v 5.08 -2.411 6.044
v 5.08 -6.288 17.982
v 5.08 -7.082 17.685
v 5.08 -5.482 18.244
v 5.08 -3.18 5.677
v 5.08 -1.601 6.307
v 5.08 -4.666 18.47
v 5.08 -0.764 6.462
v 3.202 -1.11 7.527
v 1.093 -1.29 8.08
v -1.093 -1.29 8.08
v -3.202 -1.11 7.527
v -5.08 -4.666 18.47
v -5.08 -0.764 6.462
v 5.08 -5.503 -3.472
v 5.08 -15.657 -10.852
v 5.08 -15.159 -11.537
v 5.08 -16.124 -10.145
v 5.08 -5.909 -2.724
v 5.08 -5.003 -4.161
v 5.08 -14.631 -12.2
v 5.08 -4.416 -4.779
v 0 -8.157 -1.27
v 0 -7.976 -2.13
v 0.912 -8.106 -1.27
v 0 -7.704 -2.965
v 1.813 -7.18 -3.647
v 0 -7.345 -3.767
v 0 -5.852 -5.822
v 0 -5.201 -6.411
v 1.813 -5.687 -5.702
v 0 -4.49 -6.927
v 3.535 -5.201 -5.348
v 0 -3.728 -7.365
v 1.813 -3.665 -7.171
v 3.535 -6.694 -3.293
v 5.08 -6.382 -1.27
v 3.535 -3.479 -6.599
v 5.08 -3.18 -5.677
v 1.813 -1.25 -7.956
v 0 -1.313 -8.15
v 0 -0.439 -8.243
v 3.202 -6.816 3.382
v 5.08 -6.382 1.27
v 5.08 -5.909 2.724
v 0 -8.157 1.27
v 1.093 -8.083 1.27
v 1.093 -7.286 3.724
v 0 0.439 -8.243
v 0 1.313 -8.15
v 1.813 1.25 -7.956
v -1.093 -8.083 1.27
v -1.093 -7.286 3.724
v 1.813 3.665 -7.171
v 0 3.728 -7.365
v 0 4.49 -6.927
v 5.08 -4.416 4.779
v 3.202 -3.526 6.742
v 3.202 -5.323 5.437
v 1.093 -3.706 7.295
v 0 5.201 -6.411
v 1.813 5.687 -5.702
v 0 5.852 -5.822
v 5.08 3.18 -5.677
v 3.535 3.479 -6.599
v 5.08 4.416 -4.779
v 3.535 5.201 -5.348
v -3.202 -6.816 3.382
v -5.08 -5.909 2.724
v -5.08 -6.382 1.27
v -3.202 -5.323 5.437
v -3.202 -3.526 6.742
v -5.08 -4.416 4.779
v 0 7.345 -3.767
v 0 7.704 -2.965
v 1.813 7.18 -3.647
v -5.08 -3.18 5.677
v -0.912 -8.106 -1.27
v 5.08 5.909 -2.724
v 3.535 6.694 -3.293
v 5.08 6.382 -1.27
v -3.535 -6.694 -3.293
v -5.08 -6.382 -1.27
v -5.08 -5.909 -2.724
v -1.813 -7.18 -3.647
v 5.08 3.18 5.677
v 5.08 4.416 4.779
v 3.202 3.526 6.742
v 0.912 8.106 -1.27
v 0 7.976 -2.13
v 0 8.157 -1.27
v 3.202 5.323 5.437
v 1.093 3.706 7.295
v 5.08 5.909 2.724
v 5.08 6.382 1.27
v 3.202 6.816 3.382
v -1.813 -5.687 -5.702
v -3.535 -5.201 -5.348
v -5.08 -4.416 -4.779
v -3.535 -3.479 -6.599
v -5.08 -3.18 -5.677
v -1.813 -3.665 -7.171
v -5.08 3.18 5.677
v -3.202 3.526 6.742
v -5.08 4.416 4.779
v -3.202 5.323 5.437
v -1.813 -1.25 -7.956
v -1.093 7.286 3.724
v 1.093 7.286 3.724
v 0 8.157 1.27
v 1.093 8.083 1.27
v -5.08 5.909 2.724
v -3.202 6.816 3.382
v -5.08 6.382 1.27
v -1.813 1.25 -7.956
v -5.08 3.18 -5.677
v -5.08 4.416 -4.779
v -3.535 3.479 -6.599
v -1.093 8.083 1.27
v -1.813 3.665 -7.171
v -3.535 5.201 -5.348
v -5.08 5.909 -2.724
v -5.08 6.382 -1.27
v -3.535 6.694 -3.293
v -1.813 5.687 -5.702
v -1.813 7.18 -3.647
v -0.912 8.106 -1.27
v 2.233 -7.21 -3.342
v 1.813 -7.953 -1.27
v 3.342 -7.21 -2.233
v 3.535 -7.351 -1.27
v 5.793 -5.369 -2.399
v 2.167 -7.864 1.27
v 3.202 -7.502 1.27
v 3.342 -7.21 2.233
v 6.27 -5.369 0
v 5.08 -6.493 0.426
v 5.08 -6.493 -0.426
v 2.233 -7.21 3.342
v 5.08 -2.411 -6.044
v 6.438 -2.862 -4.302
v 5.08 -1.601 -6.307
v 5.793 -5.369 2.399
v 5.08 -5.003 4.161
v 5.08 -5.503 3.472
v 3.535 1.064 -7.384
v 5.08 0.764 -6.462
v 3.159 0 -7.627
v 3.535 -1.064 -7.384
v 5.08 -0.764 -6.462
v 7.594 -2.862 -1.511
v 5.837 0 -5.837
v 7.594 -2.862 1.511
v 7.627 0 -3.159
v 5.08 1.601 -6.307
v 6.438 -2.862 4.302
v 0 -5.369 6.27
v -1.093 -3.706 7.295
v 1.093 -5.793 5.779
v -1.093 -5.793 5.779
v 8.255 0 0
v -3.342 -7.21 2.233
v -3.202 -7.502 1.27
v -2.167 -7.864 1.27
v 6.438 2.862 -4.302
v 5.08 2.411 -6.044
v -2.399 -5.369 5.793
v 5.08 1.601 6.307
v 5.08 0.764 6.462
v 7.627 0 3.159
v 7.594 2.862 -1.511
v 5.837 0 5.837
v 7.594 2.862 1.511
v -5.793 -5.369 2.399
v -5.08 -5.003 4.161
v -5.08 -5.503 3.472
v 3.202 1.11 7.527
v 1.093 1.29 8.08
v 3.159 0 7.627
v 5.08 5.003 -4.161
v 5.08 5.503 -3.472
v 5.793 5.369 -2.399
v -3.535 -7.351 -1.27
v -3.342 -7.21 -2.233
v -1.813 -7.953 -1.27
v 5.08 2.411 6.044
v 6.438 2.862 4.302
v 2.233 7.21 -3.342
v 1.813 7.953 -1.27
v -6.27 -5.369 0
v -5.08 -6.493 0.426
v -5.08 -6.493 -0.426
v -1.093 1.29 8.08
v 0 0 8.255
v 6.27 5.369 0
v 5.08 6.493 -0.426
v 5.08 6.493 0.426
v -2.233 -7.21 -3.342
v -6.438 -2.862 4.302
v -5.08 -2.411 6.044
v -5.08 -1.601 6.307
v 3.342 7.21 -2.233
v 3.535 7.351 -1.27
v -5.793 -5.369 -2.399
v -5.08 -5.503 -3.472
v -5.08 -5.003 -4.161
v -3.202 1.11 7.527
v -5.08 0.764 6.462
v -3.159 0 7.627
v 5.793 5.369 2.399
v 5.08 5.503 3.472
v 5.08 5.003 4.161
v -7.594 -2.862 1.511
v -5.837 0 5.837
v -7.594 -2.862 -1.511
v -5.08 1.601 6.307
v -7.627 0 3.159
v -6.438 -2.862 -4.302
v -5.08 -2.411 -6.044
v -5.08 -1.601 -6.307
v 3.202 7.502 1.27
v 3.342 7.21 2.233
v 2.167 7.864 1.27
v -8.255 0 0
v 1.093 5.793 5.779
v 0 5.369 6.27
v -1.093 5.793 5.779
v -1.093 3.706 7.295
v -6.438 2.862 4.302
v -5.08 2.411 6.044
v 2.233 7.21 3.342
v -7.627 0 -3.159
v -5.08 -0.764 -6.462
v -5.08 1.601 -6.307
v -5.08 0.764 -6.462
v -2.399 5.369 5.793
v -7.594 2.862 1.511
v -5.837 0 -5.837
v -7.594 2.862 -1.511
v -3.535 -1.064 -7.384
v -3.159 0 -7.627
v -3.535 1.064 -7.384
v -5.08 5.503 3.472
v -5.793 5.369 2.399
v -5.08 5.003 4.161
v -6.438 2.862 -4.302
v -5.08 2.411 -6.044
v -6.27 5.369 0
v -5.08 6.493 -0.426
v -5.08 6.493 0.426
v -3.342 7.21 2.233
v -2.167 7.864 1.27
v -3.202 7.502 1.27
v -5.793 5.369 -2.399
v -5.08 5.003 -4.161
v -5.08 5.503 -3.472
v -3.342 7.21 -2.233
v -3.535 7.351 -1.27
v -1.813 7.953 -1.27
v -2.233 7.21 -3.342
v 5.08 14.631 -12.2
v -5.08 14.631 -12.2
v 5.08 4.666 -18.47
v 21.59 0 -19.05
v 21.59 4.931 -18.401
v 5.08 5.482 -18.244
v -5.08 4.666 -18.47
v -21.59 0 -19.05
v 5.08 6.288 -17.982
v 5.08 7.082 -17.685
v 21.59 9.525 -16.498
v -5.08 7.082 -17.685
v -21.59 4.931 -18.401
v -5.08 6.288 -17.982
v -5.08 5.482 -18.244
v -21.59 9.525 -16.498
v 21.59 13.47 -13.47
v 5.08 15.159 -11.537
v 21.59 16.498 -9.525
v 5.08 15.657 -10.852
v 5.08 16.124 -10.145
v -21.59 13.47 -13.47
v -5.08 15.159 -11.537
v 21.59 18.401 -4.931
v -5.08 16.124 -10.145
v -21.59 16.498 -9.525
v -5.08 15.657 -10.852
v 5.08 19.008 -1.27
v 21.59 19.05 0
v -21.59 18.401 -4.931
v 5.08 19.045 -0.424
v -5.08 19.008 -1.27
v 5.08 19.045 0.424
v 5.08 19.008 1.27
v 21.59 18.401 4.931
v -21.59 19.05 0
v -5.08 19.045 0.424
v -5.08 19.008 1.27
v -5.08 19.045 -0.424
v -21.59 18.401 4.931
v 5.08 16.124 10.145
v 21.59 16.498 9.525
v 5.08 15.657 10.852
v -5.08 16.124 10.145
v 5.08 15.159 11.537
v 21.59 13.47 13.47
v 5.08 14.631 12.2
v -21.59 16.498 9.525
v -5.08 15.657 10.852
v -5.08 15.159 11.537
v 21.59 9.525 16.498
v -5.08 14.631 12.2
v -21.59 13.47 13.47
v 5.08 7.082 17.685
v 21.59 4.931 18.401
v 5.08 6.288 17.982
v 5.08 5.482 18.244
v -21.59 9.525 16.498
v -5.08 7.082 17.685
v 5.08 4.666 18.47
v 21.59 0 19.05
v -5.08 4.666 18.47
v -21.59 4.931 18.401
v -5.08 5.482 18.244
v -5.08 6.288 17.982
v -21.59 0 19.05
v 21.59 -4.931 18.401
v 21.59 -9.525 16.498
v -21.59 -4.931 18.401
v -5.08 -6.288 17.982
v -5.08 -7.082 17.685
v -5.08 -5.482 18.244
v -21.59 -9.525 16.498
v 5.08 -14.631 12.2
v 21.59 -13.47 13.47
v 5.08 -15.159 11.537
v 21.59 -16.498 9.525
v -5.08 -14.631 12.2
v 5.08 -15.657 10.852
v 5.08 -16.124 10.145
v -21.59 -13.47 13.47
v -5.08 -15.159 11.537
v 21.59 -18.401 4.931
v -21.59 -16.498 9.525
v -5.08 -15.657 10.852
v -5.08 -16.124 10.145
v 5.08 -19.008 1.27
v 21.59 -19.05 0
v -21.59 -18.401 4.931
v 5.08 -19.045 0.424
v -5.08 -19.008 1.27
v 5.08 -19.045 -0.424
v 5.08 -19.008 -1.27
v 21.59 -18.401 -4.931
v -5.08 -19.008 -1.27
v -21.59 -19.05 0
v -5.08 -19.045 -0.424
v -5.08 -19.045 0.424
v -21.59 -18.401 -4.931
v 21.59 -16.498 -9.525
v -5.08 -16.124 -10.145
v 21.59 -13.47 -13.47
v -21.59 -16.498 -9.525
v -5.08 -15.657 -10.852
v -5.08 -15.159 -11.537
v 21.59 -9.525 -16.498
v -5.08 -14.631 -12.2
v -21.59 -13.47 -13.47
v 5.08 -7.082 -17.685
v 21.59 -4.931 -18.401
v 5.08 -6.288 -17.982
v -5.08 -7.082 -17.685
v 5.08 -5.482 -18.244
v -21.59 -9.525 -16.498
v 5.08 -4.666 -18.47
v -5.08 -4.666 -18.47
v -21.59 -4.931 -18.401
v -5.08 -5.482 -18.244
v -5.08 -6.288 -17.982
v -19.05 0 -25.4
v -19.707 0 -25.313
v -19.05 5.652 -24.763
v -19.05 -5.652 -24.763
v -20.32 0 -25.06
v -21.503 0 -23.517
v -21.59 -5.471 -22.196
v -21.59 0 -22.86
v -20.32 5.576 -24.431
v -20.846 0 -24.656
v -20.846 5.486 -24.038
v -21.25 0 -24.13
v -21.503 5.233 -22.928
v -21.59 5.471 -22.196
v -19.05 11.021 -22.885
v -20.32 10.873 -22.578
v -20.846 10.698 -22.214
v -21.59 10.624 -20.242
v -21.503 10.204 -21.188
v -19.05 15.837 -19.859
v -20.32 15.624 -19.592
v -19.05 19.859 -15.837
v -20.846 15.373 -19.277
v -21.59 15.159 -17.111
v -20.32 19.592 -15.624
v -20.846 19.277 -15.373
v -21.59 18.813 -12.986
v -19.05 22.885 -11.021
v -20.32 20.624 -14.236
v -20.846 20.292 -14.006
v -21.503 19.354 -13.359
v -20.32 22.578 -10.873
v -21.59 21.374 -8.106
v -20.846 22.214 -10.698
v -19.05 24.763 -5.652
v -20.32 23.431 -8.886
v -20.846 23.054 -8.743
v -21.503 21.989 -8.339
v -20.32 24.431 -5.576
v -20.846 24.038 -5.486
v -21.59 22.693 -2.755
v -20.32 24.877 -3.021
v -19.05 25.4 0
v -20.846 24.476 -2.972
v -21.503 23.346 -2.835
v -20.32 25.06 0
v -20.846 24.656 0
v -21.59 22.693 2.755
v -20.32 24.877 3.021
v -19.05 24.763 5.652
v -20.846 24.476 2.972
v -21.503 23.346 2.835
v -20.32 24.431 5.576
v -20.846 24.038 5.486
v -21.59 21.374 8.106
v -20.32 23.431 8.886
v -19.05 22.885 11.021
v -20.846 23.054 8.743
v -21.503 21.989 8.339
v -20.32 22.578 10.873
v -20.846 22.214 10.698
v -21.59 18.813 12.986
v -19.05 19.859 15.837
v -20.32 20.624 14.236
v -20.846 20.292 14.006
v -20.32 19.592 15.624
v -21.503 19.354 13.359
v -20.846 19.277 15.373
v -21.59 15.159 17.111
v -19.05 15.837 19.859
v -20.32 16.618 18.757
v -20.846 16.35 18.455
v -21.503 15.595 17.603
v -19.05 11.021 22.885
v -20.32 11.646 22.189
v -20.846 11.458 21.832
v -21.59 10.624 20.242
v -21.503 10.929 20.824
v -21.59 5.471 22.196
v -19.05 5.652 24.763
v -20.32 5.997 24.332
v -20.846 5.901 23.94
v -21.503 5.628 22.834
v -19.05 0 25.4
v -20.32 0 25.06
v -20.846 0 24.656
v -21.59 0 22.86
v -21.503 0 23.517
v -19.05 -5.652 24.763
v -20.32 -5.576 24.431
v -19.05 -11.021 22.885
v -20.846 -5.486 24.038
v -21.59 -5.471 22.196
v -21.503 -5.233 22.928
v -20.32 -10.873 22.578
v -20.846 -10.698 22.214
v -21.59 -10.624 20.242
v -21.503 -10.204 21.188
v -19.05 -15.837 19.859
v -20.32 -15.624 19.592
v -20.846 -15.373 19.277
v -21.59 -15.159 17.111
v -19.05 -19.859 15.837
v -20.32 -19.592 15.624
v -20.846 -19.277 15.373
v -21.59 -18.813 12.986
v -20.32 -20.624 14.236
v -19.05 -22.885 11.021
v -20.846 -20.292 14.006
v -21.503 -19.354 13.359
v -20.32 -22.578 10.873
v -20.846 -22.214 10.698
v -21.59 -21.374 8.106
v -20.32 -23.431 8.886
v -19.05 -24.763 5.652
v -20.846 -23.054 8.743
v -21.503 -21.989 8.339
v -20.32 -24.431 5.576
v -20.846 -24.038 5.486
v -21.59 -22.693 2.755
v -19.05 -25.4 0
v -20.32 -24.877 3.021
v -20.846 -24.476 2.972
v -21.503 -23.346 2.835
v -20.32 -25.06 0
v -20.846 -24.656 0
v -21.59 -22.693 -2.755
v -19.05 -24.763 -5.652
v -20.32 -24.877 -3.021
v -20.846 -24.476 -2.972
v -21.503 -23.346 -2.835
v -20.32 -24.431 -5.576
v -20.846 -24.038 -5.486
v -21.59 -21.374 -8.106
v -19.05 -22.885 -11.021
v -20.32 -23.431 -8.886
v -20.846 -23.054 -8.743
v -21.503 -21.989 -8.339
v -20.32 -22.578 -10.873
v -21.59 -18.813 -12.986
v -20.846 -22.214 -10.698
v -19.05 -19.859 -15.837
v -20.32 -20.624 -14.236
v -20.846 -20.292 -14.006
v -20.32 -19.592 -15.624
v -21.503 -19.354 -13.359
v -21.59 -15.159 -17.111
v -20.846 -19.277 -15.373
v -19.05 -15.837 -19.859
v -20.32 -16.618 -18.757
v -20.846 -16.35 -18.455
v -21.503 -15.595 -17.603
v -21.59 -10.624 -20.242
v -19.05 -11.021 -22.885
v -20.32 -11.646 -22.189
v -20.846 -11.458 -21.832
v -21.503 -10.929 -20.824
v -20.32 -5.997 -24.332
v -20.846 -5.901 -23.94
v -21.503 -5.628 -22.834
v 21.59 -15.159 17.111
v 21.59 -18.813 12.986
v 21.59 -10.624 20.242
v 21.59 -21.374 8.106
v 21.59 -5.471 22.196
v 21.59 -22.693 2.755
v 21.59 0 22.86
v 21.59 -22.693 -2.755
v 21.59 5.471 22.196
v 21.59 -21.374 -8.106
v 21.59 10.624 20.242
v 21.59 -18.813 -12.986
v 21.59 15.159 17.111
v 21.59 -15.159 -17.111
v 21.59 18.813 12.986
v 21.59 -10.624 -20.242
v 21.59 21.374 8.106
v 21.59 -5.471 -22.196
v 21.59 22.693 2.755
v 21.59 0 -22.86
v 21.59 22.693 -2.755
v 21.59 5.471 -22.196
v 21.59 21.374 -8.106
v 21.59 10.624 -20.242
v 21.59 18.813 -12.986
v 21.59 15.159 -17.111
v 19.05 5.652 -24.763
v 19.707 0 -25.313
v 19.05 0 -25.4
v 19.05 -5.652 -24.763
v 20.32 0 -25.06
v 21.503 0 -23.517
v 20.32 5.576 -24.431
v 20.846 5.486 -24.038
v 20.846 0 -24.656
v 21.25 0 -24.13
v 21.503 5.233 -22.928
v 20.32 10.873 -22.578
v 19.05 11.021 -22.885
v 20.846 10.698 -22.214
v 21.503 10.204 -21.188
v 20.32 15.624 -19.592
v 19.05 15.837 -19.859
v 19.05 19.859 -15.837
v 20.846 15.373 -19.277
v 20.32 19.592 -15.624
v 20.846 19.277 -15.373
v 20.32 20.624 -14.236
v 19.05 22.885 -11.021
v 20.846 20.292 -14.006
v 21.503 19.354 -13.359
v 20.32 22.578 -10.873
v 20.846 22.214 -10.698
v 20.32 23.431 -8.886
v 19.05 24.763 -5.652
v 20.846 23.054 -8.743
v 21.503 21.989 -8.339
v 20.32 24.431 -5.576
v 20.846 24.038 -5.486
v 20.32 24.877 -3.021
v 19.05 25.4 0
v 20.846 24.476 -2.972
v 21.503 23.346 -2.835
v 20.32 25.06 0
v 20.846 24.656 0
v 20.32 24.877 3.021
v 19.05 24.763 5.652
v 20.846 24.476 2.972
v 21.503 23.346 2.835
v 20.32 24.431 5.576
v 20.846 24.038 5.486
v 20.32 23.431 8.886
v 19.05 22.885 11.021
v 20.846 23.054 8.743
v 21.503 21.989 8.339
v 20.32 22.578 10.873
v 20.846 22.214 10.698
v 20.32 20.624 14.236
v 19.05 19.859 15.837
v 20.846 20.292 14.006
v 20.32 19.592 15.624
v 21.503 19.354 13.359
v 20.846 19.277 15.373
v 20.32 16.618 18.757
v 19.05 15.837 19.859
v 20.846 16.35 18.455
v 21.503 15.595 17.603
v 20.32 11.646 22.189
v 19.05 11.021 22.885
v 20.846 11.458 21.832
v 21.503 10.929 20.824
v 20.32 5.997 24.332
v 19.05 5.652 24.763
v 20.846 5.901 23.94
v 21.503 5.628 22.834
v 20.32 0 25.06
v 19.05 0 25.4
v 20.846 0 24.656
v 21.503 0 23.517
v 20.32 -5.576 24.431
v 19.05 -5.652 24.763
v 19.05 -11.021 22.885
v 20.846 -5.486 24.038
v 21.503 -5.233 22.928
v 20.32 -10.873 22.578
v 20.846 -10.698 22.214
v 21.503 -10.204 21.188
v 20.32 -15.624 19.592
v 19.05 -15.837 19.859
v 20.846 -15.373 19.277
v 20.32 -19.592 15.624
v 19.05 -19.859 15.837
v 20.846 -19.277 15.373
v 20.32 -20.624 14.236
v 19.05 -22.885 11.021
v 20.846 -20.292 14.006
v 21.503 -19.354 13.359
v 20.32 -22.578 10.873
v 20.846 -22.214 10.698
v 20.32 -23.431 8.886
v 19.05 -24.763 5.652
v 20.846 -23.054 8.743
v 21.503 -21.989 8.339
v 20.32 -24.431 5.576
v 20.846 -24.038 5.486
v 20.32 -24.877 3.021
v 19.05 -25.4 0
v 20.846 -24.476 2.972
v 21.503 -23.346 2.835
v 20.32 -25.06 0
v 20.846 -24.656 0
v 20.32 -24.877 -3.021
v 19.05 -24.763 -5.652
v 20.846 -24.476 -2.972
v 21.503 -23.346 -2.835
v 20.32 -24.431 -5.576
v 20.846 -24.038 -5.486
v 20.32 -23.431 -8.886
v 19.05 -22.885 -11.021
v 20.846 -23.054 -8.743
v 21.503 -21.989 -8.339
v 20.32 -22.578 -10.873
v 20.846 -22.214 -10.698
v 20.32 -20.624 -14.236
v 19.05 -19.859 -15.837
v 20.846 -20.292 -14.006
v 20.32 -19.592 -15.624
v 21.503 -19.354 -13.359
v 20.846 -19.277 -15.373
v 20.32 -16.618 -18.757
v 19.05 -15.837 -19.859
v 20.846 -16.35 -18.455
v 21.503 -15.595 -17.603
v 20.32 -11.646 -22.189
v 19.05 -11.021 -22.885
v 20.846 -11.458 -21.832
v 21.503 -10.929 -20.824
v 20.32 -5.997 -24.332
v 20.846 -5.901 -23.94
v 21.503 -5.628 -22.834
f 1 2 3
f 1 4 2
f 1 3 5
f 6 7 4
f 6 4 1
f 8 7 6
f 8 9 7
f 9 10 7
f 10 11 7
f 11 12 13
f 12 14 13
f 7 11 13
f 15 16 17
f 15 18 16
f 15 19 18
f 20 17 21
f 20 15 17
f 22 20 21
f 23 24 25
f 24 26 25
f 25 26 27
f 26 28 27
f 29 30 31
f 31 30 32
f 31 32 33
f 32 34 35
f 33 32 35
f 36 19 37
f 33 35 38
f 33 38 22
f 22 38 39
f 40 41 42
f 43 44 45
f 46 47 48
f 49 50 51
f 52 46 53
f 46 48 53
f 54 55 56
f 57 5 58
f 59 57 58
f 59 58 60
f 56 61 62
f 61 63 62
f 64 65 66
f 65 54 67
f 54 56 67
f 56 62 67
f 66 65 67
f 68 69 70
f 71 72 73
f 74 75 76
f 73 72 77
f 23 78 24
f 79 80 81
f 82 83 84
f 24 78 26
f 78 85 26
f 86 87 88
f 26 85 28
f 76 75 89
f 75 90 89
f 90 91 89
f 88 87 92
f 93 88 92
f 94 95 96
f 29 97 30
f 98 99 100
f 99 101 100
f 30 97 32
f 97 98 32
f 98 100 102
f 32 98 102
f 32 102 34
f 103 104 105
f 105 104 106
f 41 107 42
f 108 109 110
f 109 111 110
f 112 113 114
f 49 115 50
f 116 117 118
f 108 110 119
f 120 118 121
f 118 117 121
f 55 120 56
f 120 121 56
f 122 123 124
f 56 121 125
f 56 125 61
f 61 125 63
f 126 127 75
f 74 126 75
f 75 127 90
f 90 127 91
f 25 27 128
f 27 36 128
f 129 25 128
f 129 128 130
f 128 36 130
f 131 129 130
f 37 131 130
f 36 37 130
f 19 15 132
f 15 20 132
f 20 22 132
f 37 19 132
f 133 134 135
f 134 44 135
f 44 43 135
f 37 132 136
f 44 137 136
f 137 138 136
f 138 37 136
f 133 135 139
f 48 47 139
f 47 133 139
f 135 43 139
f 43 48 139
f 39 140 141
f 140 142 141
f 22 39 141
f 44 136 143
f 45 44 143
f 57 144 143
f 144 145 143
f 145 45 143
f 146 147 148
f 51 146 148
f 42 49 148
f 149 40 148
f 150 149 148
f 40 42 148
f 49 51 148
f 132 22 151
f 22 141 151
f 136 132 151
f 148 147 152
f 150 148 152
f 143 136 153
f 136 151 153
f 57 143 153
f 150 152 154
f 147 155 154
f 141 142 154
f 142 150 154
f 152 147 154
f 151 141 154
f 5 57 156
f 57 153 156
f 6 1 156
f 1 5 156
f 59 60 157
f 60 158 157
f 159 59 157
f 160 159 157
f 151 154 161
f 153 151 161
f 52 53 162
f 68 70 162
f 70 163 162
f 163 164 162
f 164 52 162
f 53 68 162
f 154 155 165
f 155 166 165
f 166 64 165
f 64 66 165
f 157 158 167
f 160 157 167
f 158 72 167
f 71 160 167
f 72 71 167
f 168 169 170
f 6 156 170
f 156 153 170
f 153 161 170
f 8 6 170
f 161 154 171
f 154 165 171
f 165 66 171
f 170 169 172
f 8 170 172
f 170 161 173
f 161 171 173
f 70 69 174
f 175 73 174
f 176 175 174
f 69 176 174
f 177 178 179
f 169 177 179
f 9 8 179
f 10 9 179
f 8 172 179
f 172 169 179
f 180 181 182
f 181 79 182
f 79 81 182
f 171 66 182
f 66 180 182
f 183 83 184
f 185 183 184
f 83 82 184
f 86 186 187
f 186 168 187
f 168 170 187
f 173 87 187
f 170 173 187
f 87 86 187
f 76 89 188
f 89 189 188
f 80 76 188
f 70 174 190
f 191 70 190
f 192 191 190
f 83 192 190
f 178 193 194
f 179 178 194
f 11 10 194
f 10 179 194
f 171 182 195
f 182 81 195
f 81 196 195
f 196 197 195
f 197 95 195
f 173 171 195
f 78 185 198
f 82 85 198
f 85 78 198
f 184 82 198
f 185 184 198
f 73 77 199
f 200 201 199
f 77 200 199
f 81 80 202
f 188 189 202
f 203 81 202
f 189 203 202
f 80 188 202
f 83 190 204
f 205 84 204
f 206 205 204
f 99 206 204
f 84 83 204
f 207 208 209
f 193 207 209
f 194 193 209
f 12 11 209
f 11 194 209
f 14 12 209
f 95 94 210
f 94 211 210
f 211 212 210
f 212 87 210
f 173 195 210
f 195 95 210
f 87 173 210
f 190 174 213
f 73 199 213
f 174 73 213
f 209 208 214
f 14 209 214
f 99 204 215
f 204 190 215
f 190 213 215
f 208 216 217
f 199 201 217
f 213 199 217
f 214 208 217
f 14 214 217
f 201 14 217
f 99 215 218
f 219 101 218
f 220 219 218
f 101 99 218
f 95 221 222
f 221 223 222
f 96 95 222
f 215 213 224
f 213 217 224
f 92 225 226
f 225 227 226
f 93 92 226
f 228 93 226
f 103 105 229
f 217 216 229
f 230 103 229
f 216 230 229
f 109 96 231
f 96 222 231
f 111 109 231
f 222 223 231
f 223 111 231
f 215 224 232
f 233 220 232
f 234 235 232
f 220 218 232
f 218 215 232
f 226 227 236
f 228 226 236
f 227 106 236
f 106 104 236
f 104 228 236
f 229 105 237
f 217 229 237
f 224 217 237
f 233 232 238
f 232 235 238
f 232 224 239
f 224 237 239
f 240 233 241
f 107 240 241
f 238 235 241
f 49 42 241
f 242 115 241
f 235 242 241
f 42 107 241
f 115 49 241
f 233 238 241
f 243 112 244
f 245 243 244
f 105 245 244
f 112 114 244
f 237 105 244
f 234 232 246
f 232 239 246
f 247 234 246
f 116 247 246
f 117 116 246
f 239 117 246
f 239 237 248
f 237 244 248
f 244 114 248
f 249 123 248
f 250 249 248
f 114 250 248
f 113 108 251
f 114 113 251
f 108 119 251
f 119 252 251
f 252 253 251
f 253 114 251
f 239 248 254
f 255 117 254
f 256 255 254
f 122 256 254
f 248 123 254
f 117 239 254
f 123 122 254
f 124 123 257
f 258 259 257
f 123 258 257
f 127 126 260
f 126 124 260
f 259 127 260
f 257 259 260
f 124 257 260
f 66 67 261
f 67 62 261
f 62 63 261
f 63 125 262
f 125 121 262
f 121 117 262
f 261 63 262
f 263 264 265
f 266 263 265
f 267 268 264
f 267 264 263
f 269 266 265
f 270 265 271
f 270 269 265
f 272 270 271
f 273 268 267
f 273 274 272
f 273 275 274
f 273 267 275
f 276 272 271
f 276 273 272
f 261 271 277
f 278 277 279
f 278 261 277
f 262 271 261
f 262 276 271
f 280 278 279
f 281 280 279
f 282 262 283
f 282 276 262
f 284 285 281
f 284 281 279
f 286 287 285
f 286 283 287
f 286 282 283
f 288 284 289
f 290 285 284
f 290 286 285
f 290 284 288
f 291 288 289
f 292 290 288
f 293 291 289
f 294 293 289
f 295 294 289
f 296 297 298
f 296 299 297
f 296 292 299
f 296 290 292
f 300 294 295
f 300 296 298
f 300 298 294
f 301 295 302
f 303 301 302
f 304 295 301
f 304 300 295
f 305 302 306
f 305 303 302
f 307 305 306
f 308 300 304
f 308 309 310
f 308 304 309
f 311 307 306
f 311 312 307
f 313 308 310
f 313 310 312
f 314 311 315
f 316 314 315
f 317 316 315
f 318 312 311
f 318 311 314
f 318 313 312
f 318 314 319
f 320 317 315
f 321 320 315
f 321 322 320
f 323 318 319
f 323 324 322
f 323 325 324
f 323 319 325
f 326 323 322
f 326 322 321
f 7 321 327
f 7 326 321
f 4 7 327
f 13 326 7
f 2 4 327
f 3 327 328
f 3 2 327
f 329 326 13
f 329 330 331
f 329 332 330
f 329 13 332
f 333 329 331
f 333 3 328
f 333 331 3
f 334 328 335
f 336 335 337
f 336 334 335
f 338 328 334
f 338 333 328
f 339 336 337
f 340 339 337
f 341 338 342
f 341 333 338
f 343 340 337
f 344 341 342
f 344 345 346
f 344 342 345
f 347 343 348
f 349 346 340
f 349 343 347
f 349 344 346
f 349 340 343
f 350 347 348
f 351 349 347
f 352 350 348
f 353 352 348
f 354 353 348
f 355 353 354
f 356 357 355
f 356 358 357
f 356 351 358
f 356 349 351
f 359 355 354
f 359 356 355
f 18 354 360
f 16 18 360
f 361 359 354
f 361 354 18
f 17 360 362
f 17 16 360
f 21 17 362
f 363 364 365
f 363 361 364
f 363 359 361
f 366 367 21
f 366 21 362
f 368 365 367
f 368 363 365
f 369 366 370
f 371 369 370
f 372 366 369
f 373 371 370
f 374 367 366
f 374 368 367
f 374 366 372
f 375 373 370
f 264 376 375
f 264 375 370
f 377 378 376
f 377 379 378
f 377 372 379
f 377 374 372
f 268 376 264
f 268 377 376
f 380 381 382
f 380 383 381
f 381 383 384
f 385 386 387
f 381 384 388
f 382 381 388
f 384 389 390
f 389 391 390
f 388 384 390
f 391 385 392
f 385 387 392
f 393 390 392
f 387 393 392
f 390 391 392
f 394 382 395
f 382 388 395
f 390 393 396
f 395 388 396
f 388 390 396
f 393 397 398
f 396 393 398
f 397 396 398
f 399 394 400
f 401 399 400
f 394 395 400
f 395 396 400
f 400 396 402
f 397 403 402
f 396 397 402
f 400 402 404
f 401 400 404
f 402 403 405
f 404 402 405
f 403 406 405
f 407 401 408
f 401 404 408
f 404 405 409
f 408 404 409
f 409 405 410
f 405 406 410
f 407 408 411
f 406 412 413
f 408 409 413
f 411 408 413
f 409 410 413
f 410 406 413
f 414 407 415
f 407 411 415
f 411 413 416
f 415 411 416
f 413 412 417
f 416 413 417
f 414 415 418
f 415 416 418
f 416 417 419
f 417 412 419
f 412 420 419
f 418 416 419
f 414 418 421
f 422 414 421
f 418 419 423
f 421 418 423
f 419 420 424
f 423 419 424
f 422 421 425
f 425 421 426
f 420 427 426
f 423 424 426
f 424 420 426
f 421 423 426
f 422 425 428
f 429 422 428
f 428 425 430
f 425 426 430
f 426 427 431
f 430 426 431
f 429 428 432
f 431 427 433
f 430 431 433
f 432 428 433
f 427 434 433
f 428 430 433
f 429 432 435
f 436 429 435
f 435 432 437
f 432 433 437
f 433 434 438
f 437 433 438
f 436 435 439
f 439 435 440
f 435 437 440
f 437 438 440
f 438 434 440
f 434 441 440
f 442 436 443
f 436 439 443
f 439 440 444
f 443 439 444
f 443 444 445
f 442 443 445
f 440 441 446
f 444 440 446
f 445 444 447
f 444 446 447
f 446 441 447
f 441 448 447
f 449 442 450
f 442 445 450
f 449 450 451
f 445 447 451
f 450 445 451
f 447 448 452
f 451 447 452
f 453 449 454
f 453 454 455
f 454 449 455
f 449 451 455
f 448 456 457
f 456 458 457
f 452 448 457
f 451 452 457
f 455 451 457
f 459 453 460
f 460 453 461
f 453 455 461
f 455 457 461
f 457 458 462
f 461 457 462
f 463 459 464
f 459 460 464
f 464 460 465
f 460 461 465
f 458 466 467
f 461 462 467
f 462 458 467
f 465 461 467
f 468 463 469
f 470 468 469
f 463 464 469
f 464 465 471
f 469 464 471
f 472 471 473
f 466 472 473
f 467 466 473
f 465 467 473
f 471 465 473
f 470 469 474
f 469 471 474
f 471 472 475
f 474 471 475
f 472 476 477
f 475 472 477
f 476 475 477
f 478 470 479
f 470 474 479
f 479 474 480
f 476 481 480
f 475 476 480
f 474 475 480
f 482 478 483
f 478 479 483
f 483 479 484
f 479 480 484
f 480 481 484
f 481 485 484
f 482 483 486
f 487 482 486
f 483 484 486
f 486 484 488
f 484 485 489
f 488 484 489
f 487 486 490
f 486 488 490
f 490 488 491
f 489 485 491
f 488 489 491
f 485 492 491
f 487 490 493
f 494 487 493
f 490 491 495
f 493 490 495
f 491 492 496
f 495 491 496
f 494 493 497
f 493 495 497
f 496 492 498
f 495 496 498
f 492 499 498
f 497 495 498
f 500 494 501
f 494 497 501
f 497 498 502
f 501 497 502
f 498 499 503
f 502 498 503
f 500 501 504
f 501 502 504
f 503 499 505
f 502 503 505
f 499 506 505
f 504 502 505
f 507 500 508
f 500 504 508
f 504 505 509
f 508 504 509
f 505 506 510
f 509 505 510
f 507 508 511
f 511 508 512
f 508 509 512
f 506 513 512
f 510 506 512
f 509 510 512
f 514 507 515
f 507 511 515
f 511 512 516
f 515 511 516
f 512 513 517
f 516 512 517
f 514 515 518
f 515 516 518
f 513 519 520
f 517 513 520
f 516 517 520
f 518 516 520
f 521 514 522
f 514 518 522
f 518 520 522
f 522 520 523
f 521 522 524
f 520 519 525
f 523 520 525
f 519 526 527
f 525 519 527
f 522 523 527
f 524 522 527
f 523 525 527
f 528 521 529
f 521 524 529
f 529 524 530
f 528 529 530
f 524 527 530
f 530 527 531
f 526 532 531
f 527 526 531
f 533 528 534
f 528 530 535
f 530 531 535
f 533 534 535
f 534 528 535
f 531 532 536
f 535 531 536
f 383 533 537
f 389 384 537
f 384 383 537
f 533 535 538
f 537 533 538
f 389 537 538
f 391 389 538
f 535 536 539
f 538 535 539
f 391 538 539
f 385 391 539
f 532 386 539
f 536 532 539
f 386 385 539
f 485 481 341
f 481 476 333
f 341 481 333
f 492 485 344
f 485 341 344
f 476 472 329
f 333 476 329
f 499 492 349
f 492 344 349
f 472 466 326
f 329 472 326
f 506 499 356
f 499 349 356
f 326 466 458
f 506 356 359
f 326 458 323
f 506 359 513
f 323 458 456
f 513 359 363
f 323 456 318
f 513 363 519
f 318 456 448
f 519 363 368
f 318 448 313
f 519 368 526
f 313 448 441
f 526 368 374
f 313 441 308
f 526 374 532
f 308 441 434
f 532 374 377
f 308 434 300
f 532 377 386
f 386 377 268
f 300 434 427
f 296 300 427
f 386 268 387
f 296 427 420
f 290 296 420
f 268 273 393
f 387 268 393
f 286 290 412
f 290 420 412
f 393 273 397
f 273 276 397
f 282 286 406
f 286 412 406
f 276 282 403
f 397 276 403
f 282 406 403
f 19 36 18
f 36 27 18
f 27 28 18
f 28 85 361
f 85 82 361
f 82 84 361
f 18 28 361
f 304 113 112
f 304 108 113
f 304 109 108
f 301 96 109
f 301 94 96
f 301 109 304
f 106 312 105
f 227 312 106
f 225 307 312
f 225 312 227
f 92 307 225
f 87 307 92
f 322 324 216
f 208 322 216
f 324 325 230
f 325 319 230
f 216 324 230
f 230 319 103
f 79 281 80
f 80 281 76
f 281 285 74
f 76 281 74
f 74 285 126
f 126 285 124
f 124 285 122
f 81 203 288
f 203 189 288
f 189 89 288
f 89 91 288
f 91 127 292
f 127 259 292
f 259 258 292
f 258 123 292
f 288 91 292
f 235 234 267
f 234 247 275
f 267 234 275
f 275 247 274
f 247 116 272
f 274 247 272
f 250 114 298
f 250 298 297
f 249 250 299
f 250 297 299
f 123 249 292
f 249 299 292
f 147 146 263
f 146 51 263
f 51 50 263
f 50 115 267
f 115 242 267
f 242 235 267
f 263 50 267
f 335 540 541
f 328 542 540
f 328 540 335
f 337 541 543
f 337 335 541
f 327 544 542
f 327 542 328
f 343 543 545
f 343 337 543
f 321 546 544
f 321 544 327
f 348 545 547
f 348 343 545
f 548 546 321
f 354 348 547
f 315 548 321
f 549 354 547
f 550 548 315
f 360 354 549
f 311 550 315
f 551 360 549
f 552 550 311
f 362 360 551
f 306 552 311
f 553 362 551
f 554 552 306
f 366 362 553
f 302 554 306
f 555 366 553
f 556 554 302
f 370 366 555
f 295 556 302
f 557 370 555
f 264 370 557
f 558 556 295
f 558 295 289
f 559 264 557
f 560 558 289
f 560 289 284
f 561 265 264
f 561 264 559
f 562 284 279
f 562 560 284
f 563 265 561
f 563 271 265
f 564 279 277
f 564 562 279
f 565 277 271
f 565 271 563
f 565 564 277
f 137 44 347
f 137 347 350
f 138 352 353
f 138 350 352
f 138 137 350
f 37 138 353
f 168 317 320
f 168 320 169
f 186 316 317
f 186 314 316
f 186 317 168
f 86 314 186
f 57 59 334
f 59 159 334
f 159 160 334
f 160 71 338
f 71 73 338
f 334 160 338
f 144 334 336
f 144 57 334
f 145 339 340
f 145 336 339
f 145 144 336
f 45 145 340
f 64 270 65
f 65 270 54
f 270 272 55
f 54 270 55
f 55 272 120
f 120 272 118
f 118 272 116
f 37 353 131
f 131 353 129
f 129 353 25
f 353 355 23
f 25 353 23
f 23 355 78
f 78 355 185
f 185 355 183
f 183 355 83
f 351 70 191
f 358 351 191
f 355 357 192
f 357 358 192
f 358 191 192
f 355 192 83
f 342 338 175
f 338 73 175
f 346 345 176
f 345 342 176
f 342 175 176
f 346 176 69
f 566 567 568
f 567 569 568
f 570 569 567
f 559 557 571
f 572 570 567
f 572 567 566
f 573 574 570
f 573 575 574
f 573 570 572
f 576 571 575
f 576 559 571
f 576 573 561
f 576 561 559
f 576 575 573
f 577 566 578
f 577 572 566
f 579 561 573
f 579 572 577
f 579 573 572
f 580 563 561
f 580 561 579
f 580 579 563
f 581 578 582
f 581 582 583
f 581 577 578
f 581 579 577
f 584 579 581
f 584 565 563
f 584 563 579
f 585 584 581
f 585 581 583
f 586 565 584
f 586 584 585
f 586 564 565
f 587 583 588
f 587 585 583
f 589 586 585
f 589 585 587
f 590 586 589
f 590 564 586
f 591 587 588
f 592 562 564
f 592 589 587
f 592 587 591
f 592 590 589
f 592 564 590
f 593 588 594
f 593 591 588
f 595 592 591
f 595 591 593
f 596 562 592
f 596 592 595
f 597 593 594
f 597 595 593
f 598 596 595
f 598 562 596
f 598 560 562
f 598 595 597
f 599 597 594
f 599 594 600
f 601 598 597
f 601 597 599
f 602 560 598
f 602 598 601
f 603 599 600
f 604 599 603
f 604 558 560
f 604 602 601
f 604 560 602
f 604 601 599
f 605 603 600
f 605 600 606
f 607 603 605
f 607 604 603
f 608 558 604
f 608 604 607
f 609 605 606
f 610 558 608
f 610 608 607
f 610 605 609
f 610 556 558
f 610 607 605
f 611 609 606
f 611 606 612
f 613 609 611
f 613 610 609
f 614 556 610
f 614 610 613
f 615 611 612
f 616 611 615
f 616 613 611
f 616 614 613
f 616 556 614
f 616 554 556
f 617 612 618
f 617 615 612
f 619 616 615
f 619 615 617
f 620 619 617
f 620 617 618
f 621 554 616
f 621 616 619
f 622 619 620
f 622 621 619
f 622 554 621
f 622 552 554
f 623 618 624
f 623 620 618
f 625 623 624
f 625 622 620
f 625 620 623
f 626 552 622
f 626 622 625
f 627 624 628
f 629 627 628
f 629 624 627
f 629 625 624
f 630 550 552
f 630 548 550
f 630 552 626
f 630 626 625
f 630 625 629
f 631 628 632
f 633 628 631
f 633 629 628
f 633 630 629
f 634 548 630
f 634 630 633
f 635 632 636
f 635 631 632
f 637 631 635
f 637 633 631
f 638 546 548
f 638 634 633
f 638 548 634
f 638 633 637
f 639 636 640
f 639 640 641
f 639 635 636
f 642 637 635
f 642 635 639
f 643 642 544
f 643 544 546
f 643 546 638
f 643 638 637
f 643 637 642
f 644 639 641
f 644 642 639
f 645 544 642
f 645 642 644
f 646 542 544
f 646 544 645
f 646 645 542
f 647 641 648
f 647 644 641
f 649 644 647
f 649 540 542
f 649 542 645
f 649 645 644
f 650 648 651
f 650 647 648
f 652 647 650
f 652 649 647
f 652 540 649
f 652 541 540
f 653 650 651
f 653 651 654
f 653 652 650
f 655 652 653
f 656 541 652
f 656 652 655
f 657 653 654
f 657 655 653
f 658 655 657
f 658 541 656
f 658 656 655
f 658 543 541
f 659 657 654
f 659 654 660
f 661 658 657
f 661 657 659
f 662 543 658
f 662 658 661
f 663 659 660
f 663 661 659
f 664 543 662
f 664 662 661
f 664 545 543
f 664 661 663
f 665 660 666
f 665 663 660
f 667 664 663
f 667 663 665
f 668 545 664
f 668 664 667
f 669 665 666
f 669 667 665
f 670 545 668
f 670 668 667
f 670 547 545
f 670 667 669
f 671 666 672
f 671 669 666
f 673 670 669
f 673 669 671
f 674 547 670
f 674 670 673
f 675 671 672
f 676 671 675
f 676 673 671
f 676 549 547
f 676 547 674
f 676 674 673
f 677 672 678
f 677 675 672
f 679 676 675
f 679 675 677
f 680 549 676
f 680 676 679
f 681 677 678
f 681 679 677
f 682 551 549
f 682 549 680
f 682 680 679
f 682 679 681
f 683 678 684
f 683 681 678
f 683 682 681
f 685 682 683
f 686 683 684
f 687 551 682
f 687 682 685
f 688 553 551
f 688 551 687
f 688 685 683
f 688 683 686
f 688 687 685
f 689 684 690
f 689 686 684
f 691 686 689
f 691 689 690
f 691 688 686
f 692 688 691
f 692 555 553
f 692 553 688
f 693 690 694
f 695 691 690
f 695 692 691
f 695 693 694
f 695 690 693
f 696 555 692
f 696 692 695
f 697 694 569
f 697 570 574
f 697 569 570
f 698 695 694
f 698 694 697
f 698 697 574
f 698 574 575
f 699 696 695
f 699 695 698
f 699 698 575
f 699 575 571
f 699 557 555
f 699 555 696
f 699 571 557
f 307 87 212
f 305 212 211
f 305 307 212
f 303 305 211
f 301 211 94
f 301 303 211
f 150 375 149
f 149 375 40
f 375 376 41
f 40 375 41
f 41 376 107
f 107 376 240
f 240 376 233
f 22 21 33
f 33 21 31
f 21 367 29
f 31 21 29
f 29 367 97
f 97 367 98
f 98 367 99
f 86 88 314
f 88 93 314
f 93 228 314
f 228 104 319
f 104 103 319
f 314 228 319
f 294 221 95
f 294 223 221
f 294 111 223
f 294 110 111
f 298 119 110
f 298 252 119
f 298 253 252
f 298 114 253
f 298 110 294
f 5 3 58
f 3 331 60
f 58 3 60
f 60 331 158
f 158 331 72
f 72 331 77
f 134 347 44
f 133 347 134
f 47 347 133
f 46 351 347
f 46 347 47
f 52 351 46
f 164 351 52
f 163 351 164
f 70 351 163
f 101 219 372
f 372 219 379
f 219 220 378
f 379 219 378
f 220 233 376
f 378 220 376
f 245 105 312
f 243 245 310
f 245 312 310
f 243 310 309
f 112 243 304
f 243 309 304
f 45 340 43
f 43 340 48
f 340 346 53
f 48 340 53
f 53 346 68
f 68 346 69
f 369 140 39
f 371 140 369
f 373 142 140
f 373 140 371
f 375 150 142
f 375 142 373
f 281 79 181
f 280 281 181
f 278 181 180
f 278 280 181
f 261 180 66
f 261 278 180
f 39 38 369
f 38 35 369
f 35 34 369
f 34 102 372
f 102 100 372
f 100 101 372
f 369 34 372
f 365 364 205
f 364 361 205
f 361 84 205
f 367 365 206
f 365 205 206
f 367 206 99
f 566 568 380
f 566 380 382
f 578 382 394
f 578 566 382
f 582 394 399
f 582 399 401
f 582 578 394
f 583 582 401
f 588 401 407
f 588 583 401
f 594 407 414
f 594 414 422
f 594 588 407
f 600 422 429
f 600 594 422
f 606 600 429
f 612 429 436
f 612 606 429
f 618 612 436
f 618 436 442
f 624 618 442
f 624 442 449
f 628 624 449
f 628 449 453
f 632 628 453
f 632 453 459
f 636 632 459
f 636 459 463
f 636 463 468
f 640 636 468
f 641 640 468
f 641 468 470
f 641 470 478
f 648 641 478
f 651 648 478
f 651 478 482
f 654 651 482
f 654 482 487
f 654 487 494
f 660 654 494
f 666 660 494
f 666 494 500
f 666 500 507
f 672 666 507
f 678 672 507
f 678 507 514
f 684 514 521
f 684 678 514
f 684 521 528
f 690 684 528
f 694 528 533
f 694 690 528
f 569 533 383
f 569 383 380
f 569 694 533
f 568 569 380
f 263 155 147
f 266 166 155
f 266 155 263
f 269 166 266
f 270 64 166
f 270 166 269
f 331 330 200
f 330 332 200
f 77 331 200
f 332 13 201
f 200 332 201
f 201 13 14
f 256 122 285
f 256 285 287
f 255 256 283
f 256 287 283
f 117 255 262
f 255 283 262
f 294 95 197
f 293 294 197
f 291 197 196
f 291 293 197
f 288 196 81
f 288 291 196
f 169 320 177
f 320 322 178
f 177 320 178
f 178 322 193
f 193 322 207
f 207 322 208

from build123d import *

# Parameters (mm, degrees)
SKETCH1_R           = 25.4
SKETCH1_R_2         = 19.05
BOSS_EXTRUDE1_DEPTH = 21.59
FILLET1_R           = 2.54
SKETCH2_W           = 2.54
SKETCH2_H           = 17.90600611
BOSS_EXTRUDE2_DEPTH = 5.08


with BuildPart() as part:
    # Sketch1 → Boss-Extrude1 (new body, symmetric)
    with BuildSketch(Plane(origin=(0, 0, 0), x_dir=(0, 0, -1), z_dir=(1, 0, 0))):
        Circle(SKETCH1_R)
        Circle(SKETCH1_R_2, mode=Mode.SUBTRACT)
    extrude(amount=BOSS_EXTRUDE1_DEPTH, both=True)

    # Fillet1
    fillet1_edges = [part.edges().sort_by_distance(p)[0] for p in [
        (-21.59, 0, 25.4),
        (21.59, 0, 25.4),
    ]]
    fillet(fillet1_edges, radius=FILLET1_R)

    # Sketch2 → Boss-Extrude2 (add, symmetric)
    with BuildSketch(Plane(origin=(0, 0, 0), x_dir=(0, 0, -1), z_dir=(1, 0, 0))):
        with Locations((0, 13.871691905)):
            Rectangle(SKETCH2_W, SKETCH2_H)
        Polygon((1.863681184, 4.72579014), (3.918584349, 3.232815599), (14.443470668, 17.719078843), (12.388567502, 19.212053384), align=None)
        Polygon((4.285499499, 2.72780022), (5.070402665, 0.312116669), (22.100026457, 5.845376858), (21.315123291, 8.26106041), align=None)
        Polygon((5.070402665, -0.312116669), (4.285499499, -2.72780022), (21.315123291, -8.26106041), (22.100026457, -5.845376858), align=None)
        Polygon((3.918584349, -3.232815599), (1.863681184, -4.72579014), (12.388567502, -19.212053384), (14.443470668, -17.719078843), align=None)
        with Locations((0, -13.871691905)):
            Rectangle(SKETCH2_W, SKETCH2_H)
        Polygon((-1.863681184, -4.72579014), (-3.918584349, -3.232815599), (-14.443470668, -17.719078843), (-12.388567502, -19.212053384), align=None)
        Polygon((-4.285499499, -2.72780022), (-5.070402665, -0.312116669), (-22.100026457, -5.845376858), (-21.315123291, -8.26106041), align=None)
        Polygon((-5.070402665, 0.312116669), (-4.285499499, 2.72780022), (-21.315123291, 8.26106041), (-22.100026457, 5.845376858), align=None)
        Polygon((-3.918584349, 3.232815599), (-1.863681184, 4.72579014), (-12.388567502, 19.212053384), (-14.443470668, 17.719078843), align=None)
    extrude(amount=BOSS_EXTRUDE2_DEPTH, both=True)

    # Sketch3 → Revolve1 (revolve)
    with BuildSketch(Plane(origin=(0, 0, 0), x_dir=(0, 0, -1), z_dir=(1, 0, 0))):
        with BuildLine():
            Line((0, 8.255), (0, -8.255))
            ThreePointArc((0, -8.255), (8.255, 0), (0, 8.255))
        make_face()
    revolve(axis=Axis((0, 8.255, 0), (0, -1, 0)))


solid = part.part
